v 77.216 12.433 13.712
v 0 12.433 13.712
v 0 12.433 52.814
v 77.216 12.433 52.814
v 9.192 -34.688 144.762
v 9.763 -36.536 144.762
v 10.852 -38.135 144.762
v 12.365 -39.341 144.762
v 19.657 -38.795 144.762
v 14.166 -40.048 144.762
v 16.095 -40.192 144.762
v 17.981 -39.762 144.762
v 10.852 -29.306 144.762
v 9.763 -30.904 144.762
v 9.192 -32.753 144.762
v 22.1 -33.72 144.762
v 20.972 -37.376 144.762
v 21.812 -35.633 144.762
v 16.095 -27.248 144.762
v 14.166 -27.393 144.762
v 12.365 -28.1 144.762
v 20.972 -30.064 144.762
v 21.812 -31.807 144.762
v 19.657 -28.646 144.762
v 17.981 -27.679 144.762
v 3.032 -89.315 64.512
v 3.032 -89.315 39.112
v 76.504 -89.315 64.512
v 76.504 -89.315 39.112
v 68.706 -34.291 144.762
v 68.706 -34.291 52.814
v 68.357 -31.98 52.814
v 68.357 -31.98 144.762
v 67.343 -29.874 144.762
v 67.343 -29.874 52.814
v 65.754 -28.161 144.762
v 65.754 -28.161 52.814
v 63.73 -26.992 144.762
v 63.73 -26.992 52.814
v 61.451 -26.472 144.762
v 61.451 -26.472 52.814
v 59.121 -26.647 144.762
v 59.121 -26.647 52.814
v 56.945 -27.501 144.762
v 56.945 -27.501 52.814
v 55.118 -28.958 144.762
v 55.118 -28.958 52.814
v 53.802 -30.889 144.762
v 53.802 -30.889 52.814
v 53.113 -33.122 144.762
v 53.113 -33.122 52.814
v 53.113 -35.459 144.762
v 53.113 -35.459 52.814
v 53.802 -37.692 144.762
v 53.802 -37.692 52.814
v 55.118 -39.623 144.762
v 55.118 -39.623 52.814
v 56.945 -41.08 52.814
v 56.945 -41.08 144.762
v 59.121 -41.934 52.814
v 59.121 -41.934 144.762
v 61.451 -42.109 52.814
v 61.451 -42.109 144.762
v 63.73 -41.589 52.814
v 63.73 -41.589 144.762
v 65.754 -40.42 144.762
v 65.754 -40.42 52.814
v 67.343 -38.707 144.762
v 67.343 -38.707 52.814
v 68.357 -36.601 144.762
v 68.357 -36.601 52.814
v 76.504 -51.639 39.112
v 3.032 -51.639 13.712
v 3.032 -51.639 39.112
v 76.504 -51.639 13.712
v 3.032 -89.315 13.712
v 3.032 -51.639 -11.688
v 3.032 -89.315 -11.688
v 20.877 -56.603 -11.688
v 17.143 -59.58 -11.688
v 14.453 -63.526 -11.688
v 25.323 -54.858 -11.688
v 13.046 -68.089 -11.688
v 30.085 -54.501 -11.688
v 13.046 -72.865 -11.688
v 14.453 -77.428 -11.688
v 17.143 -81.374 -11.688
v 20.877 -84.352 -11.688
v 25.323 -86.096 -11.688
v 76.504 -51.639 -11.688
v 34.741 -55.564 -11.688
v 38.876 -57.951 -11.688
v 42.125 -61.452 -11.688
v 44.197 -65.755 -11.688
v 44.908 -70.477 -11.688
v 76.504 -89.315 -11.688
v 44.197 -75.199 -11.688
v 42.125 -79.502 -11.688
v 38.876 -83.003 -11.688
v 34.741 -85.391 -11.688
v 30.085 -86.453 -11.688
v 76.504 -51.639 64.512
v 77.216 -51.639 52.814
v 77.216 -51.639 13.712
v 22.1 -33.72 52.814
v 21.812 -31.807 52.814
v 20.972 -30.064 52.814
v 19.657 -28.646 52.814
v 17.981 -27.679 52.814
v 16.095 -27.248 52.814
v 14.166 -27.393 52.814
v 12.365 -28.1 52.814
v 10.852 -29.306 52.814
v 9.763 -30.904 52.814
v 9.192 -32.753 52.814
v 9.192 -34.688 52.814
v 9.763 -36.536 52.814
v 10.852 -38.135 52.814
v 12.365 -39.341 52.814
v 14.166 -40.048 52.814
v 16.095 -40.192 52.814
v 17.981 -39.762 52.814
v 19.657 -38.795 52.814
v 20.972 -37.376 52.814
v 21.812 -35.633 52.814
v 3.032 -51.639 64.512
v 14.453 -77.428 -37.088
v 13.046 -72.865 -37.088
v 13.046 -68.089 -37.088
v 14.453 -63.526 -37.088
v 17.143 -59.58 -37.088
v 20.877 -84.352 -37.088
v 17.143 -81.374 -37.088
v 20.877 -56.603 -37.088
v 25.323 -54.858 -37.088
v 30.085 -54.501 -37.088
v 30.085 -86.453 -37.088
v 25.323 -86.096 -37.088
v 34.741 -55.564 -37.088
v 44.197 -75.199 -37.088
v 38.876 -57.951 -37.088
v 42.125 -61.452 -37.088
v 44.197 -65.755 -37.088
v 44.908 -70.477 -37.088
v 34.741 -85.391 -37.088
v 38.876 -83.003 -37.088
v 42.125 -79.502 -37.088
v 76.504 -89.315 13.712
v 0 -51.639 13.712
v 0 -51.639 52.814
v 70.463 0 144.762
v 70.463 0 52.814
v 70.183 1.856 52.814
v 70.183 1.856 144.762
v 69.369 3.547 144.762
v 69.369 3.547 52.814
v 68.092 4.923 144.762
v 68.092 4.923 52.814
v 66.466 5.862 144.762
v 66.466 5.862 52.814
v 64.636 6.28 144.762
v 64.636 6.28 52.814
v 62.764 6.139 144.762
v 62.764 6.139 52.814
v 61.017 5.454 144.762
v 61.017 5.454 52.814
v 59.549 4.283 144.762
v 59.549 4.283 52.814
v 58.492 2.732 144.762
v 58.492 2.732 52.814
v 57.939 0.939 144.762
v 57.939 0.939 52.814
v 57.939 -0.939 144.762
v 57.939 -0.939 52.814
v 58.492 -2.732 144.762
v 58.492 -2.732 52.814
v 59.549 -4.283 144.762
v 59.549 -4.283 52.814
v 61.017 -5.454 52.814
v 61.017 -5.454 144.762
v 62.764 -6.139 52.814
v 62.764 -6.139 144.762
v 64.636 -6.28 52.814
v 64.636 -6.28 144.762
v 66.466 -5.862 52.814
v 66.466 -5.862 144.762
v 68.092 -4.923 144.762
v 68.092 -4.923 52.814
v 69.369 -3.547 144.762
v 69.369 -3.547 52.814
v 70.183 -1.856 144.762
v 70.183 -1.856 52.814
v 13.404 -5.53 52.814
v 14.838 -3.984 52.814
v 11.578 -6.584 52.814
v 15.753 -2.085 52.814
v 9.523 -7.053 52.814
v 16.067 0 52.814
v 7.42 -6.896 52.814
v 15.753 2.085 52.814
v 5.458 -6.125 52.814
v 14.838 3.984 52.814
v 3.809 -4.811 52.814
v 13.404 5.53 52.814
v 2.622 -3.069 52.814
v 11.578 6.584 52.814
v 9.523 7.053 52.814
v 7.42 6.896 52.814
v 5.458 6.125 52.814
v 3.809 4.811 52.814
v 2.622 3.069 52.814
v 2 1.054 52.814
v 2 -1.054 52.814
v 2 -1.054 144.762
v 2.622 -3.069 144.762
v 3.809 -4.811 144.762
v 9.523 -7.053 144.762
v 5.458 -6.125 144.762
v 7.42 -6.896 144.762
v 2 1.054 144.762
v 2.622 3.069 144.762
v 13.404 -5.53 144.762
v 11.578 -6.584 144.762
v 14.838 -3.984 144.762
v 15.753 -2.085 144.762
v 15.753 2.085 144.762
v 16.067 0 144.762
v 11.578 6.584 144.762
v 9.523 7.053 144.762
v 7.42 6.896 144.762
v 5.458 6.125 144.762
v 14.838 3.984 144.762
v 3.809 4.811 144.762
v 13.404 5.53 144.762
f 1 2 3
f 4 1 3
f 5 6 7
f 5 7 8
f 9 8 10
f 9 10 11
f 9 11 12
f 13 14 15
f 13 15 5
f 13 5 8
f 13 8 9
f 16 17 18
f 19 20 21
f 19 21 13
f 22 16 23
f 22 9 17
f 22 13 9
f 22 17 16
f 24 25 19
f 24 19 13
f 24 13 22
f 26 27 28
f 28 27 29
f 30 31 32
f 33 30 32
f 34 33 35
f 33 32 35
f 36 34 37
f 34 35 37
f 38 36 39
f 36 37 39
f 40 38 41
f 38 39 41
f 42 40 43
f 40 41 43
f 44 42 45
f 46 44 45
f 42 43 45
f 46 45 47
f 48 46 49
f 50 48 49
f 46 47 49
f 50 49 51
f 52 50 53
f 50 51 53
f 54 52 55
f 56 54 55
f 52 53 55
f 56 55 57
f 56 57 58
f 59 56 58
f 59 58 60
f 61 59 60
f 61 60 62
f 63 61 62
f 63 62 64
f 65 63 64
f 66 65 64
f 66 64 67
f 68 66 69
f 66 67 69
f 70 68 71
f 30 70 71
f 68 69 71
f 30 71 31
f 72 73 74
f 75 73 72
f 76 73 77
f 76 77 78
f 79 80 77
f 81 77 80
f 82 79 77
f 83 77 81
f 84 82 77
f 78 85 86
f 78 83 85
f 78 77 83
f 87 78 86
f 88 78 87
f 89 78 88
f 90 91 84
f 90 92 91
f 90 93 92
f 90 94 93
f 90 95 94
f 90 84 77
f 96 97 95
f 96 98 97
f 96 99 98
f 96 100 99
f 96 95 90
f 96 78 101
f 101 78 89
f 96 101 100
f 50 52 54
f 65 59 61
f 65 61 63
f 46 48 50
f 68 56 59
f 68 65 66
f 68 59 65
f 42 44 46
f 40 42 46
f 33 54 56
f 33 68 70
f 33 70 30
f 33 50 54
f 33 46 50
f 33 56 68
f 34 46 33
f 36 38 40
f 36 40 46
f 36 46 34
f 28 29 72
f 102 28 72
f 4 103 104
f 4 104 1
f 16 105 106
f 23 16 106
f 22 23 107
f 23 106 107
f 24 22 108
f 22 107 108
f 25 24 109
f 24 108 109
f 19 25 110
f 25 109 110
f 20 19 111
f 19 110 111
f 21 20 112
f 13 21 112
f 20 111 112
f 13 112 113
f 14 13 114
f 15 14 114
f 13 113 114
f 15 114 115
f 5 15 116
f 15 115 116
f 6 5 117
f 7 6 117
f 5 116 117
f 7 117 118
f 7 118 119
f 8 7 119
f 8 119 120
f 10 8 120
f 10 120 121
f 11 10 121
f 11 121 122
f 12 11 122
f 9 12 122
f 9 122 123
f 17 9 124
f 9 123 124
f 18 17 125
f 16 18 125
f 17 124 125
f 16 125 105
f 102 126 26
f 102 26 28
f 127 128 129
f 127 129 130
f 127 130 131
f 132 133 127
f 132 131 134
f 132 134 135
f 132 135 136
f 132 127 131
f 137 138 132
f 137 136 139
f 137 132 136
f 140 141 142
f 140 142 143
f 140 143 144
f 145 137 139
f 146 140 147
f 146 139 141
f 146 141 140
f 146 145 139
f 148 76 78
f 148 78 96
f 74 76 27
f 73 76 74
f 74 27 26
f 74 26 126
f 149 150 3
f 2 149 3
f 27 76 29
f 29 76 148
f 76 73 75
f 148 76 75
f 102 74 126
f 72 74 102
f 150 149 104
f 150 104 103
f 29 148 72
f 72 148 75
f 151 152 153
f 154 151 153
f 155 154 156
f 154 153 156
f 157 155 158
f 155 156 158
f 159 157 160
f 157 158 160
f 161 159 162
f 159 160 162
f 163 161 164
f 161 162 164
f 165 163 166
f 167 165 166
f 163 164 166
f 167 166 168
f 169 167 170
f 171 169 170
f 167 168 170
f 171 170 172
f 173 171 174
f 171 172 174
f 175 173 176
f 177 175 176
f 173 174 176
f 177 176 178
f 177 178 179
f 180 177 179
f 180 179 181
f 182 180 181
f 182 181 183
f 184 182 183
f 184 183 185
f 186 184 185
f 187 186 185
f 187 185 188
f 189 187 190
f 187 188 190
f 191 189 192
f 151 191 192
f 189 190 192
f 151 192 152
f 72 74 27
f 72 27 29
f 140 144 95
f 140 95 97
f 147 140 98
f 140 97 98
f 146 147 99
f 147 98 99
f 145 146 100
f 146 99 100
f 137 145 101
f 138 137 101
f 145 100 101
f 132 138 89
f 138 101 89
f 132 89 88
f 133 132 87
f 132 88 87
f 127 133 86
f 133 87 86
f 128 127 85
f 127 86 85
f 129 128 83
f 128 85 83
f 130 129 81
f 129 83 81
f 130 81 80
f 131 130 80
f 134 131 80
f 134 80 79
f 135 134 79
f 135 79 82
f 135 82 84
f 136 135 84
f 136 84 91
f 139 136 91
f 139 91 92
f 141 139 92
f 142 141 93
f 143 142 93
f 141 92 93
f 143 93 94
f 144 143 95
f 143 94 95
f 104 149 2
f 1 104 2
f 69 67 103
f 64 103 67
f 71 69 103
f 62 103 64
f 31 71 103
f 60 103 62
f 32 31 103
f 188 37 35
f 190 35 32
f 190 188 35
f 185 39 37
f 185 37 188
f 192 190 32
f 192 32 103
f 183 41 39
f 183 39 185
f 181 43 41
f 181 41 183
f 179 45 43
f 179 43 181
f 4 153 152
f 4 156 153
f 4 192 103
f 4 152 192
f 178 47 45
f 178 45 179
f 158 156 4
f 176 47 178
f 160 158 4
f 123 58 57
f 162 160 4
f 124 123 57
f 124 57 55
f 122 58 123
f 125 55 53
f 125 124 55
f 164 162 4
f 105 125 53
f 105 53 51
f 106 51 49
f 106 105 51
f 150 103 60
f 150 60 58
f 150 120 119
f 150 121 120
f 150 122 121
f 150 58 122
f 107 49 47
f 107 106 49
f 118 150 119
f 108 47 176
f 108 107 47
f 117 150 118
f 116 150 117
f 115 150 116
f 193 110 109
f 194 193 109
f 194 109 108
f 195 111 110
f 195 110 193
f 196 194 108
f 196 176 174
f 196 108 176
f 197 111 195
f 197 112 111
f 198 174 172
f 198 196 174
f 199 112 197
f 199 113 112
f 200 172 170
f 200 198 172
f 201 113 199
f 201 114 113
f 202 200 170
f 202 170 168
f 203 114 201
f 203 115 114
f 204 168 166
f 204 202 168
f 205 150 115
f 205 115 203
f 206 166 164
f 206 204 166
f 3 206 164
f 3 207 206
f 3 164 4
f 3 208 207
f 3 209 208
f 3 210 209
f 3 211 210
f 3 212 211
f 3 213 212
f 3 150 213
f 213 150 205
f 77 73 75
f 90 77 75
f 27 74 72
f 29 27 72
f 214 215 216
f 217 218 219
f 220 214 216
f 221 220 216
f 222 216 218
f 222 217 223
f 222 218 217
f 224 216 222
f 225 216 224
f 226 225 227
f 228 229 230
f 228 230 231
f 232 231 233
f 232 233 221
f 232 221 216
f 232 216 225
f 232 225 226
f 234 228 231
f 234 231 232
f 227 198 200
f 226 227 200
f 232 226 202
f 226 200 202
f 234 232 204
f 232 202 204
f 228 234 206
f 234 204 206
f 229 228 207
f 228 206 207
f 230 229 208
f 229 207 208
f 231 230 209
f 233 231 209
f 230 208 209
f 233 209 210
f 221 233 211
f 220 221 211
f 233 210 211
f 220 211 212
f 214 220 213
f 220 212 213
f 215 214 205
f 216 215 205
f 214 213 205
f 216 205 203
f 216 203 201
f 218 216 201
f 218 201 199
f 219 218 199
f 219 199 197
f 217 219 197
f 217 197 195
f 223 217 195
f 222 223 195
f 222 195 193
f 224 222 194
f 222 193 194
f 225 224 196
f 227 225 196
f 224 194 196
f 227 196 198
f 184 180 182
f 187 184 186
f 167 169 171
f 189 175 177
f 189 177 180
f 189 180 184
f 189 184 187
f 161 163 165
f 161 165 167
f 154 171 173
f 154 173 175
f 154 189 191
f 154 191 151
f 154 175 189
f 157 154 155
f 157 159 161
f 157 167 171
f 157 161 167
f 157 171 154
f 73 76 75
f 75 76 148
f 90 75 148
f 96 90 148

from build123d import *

# Parameters (mm, degrees)
F0_W      = 64.072139
F0_H      = 39.1015
F1_DEPTH  = 77.216
F2_W      = 73.471168
F2_H      = 37.676289
F3_DEPTH  = 25.4
F3_FACE_W = 73.471168
F3_FACE_H = 37.67629
F4_DEPTH  = 25.4
F4_FACE_W = 73.471168
F4_FACE_H = 37.67629
F5_DEPTH  = 25.4
F6_R      = 7.073069
F6_R_2    = 6.297269
F6_R_3    = 6.490153
F6_R_4    = 7.840255
F7_DEPTH  = 91.948
F8_R      = 16.020888
F9_DEPTH  = 25.4


with BuildPart() as f1:
    # F0 (on Right) → F1 (new body)
    with BuildSketch(Plane.YZ):
        with Locations((-19.602906, 33.263037)):
            Rectangle(F0_W, F0_H)
    extrude(amount=F1_DEPTH)

    # F6 (on face) → F7 (join)
    with BuildSketch(Plane.XY.offset(52.813787)):
        with Locations((8.99431, 0)):
            Circle(F6_R)
        with Locations((64.165466, 0)):
            Circle(F6_R_2)
        with Locations((15.610009, -33.7203)):
            Circle(F6_R_3)
        with Locations((60.865443, -34.290507)):
            Circle(F6_R_4)
    extrude(amount=F7_DEPTH)


with BuildPart() as f3:
    # F2 (on face) → F3 (new body)
    with BuildSketch(Plane(origin=(0, 0, 13.712287), x_dir=(1, 0, 0), z_dir=(0, 0, -1))):
        with Locations((39.768065, 70.47712)):
            Rectangle(F2_W, F2_H)
    extrude(amount=F3_DEPTH)

    # F8 (on face) → F9 (join)
    with BuildSketch(Plane(origin=(0, 0, -11.687713), x_dir=(1, 0, 0), z_dir=(0, 0, -1))):
        with Locations((28.887536, 70.477121)):
            Circle(F8_R)
    extrude(amount=F9_DEPTH)


with BuildPart() as f4:
    # F3_face (on face) → F4 (new body)
    with BuildSketch(Plane(origin=(39.768065, -70.477121, 13.712287), x_dir=(1, 0, 0), z_dir=(0, 0, 1))):
        Rectangle(F3_FACE_W, F3_FACE_H)
    extrude(amount=F4_DEPTH)


with BuildPart() as f5:
    # F4_face (on face) → F5 (new body)
    with BuildSketch(Plane(origin=(39.768065, -70.477121, 39.112287), x_dir=(1, 0, 0), z_dir=(0, 0, 1))):
        Rectangle(F4_FACE_W, F4_FACE_H)
    extrude(amount=F5_DEPTH)


solid = Compound([f1.part, f3.part, f4.part, f5.part])
